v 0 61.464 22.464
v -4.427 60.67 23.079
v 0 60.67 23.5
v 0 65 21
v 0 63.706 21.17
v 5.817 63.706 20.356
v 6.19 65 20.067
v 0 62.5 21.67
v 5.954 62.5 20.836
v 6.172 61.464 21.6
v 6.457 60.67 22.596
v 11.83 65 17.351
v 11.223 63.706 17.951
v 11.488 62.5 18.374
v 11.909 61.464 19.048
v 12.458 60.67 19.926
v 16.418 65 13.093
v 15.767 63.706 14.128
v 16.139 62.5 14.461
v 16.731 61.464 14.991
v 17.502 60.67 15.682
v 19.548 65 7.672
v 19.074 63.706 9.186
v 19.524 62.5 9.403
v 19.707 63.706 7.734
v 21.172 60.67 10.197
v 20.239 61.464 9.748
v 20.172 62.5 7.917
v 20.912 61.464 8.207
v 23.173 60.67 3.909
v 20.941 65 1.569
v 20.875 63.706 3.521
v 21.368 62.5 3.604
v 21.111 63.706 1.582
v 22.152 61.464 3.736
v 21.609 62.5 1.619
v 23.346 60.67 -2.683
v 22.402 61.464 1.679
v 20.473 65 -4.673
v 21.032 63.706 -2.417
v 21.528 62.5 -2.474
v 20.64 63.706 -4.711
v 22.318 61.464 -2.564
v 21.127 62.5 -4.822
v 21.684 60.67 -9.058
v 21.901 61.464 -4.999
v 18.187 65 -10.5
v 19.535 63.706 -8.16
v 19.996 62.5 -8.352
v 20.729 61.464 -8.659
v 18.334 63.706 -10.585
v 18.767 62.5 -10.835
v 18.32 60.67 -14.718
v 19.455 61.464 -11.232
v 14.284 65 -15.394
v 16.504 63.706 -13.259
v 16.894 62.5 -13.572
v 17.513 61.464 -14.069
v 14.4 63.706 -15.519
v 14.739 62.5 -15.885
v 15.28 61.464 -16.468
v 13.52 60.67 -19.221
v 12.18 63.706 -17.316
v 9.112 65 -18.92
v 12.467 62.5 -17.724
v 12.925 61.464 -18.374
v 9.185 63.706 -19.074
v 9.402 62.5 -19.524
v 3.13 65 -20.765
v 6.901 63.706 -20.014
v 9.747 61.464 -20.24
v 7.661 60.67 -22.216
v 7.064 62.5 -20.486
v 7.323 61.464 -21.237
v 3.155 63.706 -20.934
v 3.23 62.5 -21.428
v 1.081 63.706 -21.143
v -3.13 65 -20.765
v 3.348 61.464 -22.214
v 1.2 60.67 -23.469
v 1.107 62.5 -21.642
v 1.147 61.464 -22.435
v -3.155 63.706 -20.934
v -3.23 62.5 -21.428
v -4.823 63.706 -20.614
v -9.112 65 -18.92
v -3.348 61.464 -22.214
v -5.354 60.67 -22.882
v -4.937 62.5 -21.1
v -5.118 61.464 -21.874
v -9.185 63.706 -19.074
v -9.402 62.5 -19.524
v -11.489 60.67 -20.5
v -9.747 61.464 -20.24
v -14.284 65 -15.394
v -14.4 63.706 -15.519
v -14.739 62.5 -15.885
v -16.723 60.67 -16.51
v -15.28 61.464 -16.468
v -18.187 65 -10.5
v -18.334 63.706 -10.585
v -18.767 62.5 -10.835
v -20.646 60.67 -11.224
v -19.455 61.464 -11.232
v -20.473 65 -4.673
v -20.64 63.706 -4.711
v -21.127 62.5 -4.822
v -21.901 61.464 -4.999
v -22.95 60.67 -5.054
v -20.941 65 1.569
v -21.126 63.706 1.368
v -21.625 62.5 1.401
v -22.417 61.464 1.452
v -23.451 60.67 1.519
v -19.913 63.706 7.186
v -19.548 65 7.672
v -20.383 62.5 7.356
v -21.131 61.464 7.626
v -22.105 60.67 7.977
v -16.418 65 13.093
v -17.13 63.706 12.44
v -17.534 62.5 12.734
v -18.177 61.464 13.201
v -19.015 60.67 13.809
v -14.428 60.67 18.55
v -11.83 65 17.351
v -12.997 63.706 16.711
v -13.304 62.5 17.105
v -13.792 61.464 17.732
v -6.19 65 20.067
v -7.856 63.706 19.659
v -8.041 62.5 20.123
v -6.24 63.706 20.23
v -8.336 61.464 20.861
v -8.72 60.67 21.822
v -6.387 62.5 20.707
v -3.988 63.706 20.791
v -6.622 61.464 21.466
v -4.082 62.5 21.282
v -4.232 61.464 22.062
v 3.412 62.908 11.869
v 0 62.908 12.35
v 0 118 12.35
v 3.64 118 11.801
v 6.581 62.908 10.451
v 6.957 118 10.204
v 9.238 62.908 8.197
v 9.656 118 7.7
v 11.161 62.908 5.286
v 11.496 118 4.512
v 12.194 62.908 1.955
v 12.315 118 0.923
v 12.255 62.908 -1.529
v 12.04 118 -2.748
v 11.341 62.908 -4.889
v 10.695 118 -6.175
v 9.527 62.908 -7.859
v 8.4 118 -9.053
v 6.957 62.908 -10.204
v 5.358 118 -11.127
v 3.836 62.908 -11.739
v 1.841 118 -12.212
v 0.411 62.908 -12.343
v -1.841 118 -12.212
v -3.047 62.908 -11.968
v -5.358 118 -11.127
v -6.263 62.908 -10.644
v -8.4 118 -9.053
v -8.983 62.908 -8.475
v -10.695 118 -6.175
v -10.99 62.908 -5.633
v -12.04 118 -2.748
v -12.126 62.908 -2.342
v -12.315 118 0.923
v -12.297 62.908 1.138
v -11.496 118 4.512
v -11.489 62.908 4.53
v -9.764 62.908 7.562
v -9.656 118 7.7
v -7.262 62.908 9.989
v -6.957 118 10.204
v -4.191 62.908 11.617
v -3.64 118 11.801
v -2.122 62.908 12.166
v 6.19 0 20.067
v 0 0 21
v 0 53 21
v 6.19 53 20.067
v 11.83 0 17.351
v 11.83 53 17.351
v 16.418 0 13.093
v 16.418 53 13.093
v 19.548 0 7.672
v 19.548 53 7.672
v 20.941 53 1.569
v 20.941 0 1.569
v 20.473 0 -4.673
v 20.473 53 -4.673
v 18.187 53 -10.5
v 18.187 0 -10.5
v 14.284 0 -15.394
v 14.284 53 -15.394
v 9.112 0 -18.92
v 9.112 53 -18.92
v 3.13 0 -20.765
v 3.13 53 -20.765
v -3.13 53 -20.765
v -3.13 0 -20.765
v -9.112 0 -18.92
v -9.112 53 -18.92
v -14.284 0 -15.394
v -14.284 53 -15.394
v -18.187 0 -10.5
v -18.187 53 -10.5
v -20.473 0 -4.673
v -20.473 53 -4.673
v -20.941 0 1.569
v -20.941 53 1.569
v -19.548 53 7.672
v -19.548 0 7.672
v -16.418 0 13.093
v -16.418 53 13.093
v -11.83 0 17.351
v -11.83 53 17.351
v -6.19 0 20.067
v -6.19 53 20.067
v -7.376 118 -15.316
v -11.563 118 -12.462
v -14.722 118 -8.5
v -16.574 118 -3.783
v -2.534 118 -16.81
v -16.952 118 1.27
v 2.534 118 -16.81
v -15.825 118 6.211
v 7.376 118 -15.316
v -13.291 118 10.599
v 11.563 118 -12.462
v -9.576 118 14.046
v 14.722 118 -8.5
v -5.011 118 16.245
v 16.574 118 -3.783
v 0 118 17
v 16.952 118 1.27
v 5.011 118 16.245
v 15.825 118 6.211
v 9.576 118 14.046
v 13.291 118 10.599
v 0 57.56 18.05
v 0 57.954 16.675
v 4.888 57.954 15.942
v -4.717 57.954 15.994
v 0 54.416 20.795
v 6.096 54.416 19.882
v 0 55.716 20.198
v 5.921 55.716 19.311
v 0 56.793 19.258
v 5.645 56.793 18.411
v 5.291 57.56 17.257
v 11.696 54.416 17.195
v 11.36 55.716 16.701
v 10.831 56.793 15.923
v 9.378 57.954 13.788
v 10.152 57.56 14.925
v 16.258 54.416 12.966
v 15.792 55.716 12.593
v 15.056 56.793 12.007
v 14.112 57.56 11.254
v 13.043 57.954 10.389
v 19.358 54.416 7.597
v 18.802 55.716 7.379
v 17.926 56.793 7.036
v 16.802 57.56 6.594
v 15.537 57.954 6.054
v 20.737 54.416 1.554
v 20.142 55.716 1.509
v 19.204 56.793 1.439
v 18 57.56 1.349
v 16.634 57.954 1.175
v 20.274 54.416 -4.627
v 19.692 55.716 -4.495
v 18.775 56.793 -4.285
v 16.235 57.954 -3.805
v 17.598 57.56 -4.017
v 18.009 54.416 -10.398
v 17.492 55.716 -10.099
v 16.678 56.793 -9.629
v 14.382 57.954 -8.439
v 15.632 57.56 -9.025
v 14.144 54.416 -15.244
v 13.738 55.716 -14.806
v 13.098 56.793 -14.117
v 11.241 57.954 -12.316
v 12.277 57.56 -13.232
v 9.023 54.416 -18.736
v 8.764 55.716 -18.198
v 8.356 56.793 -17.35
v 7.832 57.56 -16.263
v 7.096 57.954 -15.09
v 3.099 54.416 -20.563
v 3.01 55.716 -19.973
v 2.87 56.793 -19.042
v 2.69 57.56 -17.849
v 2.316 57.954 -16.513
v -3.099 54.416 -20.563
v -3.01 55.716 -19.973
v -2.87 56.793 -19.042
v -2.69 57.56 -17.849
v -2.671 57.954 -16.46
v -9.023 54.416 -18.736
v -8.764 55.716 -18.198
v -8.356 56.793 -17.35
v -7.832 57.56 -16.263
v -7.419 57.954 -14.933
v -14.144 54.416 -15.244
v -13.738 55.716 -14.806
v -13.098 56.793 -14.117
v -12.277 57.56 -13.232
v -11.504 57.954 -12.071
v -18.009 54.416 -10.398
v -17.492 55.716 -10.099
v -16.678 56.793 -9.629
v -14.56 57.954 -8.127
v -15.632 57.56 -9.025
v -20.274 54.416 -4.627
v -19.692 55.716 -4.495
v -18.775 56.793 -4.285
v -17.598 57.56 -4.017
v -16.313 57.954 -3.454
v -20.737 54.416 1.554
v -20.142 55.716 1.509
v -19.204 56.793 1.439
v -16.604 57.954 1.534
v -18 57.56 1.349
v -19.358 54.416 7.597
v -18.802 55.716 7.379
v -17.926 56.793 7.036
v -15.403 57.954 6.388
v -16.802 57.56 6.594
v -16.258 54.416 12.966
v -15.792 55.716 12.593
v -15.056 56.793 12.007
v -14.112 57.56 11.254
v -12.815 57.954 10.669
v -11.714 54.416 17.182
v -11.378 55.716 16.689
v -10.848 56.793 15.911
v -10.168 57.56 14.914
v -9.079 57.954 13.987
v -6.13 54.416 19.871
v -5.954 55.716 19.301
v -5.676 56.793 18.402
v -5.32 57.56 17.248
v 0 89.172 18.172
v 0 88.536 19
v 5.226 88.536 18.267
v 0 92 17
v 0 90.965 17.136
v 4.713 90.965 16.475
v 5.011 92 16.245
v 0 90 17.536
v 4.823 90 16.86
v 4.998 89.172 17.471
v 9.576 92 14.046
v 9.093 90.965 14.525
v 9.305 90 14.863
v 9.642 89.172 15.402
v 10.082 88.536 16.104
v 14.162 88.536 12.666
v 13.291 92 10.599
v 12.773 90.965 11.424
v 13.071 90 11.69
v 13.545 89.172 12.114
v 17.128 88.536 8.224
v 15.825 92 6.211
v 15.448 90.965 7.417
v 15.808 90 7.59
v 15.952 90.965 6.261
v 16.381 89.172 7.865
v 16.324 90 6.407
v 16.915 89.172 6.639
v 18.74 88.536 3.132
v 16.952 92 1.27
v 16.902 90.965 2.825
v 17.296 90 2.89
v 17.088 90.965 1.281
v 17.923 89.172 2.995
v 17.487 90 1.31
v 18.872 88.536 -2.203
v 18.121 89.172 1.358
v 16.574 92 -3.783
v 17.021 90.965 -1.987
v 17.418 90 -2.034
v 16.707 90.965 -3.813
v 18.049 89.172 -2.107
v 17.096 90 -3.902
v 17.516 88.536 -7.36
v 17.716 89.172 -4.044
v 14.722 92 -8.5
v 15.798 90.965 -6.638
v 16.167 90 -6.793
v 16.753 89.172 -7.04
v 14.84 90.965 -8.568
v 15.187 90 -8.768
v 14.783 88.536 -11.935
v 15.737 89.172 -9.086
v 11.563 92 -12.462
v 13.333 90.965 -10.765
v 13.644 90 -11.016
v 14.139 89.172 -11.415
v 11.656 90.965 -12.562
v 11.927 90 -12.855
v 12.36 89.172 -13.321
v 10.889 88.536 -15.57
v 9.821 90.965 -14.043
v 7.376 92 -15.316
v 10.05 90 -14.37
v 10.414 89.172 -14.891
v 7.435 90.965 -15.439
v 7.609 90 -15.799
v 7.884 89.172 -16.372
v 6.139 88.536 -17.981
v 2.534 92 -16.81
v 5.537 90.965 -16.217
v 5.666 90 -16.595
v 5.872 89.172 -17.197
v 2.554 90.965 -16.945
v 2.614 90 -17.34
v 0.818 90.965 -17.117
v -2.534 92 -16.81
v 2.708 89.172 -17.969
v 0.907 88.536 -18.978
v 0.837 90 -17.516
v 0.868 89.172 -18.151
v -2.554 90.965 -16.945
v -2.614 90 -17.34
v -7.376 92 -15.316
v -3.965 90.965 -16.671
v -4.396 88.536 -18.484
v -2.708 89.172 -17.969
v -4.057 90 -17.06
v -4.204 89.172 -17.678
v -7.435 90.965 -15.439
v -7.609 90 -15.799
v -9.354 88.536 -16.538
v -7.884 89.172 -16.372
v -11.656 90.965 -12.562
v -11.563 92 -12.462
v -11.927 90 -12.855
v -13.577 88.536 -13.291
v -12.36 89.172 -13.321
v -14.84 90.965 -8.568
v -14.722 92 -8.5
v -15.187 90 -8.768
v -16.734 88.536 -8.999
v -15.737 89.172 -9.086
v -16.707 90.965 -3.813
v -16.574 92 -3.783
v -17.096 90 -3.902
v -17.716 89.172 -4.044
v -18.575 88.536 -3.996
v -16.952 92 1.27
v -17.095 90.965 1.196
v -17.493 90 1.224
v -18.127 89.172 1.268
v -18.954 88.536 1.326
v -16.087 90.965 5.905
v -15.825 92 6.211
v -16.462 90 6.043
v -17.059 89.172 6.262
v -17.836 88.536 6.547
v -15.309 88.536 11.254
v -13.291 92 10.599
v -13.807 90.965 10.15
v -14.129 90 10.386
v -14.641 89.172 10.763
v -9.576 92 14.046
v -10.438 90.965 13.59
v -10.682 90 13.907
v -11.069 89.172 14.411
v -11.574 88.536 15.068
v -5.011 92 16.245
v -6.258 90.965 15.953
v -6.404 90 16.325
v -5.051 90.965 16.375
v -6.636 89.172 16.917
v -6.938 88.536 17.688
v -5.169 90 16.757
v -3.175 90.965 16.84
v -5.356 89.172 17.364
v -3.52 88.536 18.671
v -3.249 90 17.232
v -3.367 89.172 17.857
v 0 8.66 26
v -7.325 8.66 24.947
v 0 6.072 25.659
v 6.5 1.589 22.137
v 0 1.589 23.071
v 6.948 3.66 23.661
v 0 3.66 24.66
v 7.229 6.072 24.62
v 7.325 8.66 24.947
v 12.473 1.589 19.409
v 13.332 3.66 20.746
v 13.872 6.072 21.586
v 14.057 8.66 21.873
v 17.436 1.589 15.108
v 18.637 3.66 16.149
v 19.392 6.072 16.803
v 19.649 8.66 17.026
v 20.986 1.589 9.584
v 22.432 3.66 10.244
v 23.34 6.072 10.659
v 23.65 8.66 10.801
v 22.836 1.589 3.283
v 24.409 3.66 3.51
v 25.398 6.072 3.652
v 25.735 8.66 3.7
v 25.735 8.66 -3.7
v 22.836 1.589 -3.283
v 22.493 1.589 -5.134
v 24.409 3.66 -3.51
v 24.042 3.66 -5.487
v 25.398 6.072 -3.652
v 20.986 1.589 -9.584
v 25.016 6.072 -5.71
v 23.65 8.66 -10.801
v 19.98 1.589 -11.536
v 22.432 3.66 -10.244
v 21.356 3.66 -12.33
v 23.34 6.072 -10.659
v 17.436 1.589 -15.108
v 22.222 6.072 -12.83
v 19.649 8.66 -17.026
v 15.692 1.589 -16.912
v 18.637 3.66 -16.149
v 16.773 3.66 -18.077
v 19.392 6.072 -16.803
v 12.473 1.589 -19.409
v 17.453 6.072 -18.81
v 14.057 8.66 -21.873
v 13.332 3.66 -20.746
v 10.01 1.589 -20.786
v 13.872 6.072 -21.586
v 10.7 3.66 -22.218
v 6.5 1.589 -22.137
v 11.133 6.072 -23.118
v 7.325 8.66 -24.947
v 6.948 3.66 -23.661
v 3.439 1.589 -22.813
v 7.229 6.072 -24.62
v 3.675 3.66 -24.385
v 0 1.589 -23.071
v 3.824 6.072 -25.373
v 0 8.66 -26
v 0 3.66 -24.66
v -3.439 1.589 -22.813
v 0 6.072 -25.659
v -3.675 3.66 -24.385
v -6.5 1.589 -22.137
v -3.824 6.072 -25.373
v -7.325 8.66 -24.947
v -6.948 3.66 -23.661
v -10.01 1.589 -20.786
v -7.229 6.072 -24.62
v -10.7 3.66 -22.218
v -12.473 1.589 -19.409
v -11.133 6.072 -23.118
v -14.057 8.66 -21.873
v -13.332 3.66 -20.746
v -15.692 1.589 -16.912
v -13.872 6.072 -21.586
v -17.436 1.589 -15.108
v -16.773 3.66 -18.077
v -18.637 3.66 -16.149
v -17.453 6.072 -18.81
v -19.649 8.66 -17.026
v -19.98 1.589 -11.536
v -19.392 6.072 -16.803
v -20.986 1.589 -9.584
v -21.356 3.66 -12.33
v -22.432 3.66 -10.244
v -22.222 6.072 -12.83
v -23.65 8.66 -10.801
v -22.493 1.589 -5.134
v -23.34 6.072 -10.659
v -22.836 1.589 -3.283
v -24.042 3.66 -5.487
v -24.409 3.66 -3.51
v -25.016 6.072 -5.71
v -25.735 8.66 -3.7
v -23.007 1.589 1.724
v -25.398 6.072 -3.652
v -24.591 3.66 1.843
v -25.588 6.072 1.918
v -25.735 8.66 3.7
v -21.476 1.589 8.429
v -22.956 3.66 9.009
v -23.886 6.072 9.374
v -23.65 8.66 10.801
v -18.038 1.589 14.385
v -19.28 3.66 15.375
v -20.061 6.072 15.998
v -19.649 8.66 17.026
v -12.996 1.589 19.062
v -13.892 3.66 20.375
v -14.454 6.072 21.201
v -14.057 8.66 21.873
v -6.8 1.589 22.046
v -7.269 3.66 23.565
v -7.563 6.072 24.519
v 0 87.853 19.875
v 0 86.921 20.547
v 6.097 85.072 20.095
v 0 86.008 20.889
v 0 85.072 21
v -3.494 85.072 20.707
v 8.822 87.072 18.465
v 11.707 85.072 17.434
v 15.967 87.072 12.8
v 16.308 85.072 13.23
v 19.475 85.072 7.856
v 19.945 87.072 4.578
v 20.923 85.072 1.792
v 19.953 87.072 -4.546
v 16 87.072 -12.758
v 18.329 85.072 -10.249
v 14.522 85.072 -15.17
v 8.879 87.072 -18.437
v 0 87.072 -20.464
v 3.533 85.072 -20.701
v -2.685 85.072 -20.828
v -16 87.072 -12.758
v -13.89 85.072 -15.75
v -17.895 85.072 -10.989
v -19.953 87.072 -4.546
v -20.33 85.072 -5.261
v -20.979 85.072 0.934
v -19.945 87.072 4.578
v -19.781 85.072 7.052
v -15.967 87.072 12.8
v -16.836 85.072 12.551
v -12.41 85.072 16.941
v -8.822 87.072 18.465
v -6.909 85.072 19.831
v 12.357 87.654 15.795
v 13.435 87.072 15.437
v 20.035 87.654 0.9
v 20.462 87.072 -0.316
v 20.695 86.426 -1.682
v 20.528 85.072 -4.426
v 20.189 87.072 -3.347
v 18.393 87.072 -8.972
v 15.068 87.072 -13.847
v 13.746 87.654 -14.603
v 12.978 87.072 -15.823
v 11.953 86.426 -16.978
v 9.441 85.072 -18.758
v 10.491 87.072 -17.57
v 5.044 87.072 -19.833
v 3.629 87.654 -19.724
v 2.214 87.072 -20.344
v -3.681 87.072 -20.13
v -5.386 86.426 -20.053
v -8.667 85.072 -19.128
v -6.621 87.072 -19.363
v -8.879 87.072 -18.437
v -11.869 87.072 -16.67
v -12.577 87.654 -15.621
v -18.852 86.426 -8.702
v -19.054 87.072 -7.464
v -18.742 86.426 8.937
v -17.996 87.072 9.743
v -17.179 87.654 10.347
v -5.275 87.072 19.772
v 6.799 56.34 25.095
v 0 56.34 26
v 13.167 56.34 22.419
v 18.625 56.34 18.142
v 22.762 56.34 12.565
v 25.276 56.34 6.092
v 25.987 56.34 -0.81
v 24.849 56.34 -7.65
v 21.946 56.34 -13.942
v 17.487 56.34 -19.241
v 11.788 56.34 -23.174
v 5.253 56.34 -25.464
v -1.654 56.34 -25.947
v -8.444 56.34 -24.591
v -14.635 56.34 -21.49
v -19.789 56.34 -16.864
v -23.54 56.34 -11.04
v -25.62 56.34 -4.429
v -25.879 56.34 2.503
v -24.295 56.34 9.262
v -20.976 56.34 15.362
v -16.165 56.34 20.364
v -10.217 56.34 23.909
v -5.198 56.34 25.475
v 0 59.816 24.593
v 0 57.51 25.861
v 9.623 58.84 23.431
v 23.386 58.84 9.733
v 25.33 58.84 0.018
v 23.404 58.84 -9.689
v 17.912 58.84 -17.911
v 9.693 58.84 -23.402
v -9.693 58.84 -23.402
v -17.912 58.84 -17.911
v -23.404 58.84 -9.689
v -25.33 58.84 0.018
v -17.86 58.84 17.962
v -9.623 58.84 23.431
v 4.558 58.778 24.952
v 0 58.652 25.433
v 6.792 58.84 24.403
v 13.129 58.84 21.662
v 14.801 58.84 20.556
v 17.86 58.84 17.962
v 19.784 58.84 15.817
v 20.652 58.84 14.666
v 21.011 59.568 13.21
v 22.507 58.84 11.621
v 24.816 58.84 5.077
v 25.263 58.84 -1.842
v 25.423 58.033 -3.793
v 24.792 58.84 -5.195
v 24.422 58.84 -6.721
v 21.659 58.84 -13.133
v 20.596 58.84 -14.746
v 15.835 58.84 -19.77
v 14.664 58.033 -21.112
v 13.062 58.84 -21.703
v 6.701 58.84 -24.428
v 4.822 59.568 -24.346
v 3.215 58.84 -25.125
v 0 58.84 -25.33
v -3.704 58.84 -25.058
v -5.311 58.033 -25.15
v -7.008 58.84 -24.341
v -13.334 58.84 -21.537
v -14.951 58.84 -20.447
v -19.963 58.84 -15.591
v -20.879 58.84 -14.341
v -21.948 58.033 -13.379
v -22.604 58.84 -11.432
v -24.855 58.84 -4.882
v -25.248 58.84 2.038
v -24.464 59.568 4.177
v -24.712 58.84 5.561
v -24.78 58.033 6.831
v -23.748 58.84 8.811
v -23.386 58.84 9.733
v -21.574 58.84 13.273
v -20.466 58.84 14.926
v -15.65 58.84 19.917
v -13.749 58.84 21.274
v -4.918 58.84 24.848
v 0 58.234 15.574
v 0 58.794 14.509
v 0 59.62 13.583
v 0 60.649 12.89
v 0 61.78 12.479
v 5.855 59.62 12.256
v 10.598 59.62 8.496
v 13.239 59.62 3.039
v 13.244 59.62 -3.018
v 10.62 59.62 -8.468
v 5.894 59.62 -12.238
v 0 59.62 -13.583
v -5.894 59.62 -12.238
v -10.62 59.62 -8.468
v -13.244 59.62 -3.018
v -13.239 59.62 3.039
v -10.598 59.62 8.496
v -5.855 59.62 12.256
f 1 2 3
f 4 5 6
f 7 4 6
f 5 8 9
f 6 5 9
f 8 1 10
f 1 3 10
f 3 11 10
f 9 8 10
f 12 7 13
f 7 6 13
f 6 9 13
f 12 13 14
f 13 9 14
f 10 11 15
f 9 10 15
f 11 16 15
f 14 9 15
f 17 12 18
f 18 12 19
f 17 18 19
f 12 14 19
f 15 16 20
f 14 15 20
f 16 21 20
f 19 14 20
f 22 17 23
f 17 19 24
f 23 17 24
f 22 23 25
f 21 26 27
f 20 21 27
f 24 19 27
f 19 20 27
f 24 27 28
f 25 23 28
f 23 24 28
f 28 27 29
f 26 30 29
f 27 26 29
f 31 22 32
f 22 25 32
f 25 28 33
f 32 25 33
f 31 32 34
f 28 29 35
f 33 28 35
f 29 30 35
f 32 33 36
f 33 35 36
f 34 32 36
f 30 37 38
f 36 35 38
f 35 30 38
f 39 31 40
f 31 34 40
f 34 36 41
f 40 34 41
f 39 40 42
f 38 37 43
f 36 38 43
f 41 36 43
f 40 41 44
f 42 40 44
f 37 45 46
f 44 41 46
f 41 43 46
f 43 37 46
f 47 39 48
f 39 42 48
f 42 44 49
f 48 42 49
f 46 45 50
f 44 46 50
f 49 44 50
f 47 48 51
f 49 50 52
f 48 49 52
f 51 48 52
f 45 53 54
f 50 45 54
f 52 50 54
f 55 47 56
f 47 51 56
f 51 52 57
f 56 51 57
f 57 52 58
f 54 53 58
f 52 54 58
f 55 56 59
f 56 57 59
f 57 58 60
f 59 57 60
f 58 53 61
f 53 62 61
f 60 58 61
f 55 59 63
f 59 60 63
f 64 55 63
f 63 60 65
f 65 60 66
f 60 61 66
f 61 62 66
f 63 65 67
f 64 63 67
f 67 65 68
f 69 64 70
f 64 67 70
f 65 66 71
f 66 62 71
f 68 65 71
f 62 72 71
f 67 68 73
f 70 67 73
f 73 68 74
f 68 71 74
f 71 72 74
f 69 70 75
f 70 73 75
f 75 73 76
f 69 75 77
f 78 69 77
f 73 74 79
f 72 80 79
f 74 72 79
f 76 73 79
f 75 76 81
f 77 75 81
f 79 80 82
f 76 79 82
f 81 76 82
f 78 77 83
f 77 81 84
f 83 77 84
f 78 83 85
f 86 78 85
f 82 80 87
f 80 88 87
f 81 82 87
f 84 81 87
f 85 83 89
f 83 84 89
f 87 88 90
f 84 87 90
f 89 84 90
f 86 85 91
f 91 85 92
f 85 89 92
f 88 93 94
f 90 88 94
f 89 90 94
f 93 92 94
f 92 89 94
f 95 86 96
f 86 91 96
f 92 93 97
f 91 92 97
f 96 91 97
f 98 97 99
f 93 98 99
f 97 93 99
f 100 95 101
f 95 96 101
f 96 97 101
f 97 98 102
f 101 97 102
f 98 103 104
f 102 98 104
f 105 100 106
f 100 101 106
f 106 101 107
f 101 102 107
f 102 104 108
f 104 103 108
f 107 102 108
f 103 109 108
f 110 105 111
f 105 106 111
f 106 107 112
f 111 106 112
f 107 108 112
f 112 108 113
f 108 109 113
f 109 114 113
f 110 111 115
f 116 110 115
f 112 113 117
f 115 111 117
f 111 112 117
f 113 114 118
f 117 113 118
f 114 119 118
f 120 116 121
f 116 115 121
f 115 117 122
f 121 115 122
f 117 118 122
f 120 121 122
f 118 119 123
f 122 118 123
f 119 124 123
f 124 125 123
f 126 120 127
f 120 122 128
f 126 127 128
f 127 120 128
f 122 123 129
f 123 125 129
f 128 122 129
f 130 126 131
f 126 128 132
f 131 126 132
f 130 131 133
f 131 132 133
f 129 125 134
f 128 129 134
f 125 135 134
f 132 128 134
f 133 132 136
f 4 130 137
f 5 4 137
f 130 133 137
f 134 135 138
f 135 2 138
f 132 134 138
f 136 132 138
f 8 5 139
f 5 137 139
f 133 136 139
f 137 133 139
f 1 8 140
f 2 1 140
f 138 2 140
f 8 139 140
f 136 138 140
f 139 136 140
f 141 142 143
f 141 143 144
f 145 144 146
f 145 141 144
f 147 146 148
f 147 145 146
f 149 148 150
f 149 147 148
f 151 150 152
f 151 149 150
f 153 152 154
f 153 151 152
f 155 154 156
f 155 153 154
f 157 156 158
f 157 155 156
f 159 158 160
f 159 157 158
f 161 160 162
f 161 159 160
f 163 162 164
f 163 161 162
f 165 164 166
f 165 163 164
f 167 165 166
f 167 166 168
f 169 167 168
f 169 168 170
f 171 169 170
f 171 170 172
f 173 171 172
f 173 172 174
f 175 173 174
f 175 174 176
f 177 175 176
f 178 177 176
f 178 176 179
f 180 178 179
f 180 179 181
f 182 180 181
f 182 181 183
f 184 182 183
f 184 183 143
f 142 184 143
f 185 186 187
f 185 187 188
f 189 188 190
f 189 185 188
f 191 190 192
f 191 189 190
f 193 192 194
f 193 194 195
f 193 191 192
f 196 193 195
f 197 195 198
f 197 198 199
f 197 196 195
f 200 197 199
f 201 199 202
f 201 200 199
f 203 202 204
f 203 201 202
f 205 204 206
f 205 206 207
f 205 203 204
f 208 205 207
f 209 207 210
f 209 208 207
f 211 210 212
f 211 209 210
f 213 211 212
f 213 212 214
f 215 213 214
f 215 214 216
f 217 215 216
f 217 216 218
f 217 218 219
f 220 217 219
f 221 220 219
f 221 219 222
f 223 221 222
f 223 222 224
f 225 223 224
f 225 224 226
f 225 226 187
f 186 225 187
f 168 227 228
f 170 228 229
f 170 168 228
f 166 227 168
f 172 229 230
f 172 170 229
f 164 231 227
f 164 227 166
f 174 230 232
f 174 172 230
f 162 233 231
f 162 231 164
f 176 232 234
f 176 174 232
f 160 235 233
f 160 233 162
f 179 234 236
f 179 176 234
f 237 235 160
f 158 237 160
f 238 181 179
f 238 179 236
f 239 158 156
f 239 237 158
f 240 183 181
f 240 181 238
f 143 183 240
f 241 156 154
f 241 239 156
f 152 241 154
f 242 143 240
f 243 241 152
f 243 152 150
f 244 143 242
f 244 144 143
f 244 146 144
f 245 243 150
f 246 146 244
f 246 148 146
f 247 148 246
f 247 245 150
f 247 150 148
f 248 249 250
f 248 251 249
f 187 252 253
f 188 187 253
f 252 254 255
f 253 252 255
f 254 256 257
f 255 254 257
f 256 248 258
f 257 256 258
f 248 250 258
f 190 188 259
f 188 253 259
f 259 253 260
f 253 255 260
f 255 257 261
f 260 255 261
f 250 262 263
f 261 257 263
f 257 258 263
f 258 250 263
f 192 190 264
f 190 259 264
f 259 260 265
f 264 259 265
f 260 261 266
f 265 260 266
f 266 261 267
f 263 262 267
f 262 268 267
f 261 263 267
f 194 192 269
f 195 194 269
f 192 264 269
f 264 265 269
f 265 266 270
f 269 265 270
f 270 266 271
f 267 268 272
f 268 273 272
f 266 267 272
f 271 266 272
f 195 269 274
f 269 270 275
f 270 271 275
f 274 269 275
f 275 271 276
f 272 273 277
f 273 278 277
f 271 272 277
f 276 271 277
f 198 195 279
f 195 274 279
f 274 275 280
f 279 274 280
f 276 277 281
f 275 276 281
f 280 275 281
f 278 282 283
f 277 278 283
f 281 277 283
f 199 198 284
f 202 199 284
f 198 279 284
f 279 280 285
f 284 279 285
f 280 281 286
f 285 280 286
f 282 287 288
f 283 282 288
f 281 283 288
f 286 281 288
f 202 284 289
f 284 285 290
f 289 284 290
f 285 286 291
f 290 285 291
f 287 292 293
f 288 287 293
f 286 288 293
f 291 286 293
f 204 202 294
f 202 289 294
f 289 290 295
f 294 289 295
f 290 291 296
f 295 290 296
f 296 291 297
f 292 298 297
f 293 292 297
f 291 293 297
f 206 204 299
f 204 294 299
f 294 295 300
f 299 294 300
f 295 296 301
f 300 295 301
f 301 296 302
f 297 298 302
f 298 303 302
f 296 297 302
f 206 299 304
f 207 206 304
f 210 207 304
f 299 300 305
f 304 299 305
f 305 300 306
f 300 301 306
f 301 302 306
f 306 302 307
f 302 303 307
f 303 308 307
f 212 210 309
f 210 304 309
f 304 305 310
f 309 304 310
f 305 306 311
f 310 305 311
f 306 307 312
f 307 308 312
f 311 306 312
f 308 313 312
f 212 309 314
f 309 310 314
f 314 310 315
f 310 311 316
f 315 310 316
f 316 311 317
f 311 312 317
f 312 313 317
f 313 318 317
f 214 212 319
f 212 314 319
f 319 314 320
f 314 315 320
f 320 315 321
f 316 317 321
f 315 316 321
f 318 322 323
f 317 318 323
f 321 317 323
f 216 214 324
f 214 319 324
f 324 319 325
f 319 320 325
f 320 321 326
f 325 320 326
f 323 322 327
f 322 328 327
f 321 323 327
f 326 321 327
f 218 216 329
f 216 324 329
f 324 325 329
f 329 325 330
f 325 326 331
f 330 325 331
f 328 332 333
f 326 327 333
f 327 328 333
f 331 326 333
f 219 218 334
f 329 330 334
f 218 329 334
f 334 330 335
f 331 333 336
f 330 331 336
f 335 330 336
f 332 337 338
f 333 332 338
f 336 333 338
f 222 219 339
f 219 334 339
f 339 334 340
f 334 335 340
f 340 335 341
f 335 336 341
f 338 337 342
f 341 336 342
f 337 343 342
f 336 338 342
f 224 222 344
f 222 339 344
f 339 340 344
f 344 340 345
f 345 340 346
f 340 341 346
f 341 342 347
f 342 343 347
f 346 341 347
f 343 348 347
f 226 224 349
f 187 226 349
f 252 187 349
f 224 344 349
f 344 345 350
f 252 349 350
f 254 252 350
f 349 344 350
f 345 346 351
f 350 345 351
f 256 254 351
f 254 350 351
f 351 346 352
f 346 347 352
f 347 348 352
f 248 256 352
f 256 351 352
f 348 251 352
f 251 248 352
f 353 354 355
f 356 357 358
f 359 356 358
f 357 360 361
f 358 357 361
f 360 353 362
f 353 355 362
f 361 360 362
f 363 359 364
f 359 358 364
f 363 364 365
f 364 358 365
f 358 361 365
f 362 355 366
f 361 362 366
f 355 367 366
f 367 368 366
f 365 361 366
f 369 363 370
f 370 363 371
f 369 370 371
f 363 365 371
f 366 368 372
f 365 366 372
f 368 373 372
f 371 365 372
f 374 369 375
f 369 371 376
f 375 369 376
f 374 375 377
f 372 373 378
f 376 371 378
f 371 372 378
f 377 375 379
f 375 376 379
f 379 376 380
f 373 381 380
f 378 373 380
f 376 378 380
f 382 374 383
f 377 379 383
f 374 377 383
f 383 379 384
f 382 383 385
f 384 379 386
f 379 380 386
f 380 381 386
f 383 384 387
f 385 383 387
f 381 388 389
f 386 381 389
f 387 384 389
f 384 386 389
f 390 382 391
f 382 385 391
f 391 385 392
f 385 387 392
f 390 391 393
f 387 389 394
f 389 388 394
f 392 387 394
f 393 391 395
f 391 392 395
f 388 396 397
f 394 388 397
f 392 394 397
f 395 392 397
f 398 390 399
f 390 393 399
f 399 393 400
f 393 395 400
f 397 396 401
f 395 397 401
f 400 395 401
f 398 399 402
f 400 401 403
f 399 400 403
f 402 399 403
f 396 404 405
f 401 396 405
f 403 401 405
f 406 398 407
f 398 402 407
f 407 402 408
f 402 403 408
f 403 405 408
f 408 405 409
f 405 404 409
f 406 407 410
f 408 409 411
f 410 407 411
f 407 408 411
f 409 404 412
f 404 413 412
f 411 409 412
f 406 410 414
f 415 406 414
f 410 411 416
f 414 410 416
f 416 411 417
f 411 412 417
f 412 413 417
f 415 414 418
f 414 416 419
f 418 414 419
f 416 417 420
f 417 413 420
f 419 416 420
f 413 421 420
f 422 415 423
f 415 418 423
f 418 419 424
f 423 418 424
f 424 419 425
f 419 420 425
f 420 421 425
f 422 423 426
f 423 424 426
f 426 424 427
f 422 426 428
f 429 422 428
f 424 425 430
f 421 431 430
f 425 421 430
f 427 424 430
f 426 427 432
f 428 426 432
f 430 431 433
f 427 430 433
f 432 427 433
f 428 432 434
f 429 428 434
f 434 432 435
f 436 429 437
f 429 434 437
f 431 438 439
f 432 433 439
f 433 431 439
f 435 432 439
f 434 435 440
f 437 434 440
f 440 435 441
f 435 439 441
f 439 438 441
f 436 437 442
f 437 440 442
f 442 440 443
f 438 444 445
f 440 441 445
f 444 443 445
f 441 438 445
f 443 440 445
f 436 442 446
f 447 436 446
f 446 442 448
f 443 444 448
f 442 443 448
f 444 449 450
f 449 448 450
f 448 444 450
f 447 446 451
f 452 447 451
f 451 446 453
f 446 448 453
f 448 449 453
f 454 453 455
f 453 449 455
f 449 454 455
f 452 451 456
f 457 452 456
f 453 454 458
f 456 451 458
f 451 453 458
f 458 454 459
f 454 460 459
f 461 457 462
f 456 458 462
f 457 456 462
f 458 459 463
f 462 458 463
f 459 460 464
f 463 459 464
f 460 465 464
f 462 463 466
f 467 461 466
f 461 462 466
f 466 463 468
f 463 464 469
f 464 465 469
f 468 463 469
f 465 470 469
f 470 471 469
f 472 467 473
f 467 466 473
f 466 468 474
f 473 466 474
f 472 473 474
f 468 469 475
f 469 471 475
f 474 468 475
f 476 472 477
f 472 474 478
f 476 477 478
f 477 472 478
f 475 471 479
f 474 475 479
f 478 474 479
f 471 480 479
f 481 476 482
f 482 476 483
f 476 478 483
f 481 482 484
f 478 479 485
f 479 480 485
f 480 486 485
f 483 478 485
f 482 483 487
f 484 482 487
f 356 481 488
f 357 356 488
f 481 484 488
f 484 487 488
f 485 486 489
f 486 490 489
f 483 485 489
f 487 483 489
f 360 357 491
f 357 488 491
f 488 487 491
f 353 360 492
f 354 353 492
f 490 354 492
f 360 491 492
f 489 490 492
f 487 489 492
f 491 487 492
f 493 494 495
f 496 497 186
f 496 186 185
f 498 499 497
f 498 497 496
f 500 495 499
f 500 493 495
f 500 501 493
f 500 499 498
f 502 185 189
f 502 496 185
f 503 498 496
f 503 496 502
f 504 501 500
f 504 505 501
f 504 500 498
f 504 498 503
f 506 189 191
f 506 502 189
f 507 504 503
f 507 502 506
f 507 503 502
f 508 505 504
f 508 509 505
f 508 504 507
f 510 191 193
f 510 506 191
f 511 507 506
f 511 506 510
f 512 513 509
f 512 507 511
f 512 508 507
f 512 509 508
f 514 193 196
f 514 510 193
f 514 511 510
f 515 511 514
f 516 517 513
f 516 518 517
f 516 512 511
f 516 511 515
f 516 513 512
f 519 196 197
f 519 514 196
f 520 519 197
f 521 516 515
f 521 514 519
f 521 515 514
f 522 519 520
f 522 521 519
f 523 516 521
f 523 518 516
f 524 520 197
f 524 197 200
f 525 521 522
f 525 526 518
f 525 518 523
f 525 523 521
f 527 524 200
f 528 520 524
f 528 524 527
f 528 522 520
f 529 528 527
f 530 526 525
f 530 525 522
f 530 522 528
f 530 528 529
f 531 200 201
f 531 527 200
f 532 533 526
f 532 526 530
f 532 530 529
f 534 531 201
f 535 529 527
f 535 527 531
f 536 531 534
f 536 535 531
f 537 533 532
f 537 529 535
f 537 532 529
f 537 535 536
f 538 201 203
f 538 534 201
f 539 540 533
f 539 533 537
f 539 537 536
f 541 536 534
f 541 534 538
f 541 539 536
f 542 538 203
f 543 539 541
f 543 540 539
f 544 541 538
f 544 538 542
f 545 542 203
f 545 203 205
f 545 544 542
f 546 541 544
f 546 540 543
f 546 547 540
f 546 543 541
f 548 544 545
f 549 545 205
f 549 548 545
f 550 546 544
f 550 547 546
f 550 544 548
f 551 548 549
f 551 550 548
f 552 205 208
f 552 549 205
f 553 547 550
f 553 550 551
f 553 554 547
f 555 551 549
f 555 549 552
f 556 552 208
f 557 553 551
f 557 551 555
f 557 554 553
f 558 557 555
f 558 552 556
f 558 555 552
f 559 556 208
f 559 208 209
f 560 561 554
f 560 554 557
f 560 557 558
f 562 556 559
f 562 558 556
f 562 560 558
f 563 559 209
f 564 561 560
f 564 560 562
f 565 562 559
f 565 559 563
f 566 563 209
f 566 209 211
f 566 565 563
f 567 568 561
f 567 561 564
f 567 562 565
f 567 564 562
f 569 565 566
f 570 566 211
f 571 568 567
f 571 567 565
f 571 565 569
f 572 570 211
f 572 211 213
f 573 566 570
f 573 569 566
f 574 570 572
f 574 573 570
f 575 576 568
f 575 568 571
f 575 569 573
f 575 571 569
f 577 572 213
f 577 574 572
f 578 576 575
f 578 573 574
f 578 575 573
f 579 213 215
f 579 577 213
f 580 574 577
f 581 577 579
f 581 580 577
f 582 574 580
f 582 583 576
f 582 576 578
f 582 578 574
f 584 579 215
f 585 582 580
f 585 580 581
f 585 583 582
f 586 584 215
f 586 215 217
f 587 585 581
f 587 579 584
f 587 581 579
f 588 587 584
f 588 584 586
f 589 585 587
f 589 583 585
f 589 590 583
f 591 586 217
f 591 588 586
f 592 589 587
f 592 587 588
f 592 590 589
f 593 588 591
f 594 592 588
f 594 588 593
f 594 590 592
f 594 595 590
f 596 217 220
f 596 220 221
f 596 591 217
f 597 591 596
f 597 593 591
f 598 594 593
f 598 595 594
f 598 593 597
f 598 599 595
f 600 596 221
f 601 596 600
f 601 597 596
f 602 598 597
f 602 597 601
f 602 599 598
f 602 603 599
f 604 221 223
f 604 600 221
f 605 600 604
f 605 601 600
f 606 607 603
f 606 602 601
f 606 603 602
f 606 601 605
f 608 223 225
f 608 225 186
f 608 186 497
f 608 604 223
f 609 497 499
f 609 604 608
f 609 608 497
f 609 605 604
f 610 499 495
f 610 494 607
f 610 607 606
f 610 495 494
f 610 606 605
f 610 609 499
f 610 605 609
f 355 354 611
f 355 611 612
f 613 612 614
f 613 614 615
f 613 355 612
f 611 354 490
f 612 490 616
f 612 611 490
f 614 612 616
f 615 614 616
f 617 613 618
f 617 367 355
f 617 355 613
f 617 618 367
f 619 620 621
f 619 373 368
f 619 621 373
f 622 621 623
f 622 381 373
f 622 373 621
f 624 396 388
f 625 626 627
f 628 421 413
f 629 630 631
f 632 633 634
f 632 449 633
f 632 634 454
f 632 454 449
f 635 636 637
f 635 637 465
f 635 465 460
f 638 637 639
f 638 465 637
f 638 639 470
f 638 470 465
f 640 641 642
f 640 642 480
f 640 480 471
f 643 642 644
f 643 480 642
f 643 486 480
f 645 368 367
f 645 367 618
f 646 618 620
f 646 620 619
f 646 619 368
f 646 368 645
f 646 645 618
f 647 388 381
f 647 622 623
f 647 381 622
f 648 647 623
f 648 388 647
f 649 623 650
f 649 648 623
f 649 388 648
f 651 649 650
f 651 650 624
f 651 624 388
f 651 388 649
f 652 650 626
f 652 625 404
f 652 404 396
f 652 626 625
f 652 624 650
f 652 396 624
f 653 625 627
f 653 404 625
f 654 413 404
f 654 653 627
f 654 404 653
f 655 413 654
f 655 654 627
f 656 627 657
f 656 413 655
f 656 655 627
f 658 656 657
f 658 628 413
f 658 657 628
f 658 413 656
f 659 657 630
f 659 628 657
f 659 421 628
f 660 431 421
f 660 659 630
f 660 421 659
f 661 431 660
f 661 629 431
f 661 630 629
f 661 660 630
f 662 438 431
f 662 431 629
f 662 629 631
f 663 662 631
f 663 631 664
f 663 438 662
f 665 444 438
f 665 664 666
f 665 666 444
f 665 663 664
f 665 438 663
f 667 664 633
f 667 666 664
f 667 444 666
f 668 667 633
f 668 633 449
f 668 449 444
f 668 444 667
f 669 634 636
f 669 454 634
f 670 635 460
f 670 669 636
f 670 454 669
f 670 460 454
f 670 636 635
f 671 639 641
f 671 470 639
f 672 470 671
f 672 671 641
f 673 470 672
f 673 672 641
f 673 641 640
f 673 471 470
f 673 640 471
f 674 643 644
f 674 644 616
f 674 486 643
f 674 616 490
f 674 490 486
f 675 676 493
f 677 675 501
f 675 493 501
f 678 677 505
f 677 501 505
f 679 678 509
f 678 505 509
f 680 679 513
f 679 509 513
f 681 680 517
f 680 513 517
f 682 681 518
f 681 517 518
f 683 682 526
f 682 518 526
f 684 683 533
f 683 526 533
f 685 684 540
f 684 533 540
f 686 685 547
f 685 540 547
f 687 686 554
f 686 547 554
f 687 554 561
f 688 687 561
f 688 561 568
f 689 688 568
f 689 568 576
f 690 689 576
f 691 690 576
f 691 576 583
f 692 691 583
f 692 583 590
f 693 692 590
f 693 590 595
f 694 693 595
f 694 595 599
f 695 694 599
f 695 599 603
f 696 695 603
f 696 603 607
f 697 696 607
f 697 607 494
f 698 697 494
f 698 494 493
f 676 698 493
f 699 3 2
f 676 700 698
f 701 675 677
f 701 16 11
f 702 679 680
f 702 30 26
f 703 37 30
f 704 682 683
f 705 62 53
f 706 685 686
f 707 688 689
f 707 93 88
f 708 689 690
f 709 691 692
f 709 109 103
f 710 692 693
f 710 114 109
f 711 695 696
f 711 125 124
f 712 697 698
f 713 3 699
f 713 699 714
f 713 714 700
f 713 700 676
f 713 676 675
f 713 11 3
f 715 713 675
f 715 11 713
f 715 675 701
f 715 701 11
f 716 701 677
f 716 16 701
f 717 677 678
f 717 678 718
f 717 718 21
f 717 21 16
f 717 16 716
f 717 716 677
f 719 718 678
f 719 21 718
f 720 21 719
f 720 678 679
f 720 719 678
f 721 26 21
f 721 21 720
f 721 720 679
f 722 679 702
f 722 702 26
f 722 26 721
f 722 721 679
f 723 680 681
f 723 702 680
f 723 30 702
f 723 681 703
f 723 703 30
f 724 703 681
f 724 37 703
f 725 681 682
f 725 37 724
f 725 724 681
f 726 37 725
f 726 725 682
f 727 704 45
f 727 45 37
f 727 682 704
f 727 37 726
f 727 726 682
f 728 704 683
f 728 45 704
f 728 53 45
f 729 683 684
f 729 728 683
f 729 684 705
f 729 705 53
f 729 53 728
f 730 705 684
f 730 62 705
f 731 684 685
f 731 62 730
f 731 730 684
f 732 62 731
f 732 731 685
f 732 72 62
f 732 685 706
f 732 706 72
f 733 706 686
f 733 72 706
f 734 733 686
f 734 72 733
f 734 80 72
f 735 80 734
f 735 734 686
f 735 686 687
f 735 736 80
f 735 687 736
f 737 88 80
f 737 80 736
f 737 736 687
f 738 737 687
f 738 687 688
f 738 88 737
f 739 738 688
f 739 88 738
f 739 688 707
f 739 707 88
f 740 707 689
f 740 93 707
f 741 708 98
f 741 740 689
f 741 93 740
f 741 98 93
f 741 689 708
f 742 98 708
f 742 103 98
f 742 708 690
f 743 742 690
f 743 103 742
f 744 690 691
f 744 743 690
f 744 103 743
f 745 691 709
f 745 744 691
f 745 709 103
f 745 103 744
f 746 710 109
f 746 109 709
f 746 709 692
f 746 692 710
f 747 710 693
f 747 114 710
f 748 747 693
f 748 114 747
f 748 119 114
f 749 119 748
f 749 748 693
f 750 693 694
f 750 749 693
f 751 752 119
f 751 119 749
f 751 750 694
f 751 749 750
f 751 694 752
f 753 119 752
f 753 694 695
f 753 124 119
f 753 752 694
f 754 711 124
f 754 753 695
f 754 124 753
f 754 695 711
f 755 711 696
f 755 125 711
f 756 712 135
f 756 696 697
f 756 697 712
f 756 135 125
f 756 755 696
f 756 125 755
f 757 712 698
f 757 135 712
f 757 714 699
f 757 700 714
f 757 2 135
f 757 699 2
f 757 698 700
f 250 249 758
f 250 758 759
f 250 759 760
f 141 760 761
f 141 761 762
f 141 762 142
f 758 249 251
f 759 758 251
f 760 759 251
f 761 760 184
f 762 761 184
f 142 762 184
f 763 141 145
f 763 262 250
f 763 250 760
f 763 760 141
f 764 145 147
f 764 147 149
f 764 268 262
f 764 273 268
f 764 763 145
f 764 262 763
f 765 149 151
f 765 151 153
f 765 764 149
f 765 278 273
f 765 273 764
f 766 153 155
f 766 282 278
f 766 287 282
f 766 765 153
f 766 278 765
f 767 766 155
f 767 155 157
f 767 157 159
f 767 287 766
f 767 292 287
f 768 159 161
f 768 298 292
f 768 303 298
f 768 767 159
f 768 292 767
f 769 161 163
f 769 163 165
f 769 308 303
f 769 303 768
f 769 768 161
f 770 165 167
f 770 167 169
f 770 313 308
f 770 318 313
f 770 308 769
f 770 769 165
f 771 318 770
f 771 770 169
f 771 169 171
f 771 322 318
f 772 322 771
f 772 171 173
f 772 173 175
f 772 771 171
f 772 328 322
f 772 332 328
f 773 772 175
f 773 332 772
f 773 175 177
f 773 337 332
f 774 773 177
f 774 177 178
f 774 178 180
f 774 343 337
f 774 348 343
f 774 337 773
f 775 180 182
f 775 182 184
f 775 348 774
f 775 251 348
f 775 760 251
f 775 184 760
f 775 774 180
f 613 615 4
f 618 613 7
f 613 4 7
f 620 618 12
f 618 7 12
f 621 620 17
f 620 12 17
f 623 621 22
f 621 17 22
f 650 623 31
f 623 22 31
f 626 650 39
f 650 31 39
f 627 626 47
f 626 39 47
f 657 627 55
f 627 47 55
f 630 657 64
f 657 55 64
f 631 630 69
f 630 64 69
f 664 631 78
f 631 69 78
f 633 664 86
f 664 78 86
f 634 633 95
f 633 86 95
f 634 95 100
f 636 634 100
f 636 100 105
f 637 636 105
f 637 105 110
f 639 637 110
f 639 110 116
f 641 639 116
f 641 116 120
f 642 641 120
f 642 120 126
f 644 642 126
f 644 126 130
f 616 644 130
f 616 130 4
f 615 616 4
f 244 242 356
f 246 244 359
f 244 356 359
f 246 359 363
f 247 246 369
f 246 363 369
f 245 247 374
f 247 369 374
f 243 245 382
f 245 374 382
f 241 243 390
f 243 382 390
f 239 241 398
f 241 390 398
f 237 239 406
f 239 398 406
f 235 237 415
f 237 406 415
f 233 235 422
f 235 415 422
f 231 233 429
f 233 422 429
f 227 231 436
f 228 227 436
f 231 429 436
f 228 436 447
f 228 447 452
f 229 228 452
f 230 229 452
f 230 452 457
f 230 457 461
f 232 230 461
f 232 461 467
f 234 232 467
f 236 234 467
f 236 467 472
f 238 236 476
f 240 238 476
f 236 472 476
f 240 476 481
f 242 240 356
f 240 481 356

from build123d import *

# Parameters (mm, degrees)
SKETCH_1_R      = 26
SKETCH_1_R_2    = 21
EXTRUDE_1_DEPTH = 60
FILLET_1_R      = 10
EXTRUDE_START   = -2
SKETCH_2_R      = 21
SKETCH_2_R_2    = 12.35
EXTRUDE_2_DEPTH = 30
SKETCH_3_R      = 17
SKETCH_3_R_2    = 12.35
EXTRUDE_3_DEPTH = 30
FILLET_3_R      = 4
FILLET_4_R      = 4
FILLET_6_R      = 5
FILLET_7_R      = 5
FILLET_8_R      = 5
FILLET_9_R      = 5


# Some blends are built 0.0001 mm under size
with BuildPart() as part:
    # Эскиз1 → Вытянуть1 (new body)
    with BuildSketch(Plane(origin=(0, 0, 0), x_dir=(1, 0, 0), z_dir=(0, 1, 0))):
        with Locations(Location((0, 0, 0), (0, 0, 270))):
            Circle(SKETCH_1_R)
        with Locations(Location((0, 0, 0), (0, 0, 270))):
            Circle(SKETCH_1_R_2, mode=Mode.SUBTRACT)
    extrude(amount=EXTRUDE_1_DEPTH)

    # Скругление1
    # the kernel refuses this fillet: 10 mm, written as the material it takes off along each edge
    with BuildSketch(Plane(origin=(0, 0, 0), x_dir=(0, 0, 1), z_dir=(-1, 0, 0))) as fillet_1_piece_1:
        with BuildLine():
            CenterArc((16, 8.660254038), FILLET_1_R, 300, 60)
            Line((21, 0), (21.1, -0.173205081))
            ThreePointArc((21.1, -0.173205081), (23.5, -0.2), (26, -0.2))
            Line((26, -0.2), (26.2, 0))
            Line((26.2, 0), (26.2, 8.660254038))
            Line((26.2, 8.660254038), (26, 8.660254038))
        make_face()
    revolve(axis=Axis((0, 0, 0), (0, 1, 0)), mode=Mode.SUBTRACT)

    # Эскиз2 → Вытянуть2 (add)
    with BuildSketch(Plane(origin=(0, 60, 0), x_dir=(1, 0, 0), z_dir=(0, 1, 0)).offset(EXTRUDE_START)):
        with Locations(Location((0, 0, 0), (0, 0, 270))):
            Circle(SKETCH_2_R)
        with Locations(Location((0, 0, 0), (0, 0, 270))):
            Circle(SKETCH_2_R_2, mode=Mode.SUBTRACT)
    extrude(amount=EXTRUDE_2_DEPTH)

    # Эскиз3 → Вытянуть3 (add)
    with BuildSketch(Plane(origin=(0, 88, 0), x_dir=(1, 0, 0), z_dir=(0, 1, 0))):
        with Locations(Location((0, 0, 0), (0, 0, 270))):
            Circle(SKETCH_3_R)
        with Locations(Location((0, 0, 0), (0, 0, 270))):
            Circle(SKETCH_3_R_2, mode=Mode.SUBTRACT)
    extrude(amount=EXTRUDE_3_DEPTH)

    # Скругление3
    fillet_3_edges = [part.edges().sort_by_distance(p)[0] for p in [
        (0, 88, -17),
    ]]
    fillet(fillet_3_edges, radius=FILLET_3_R - 0.0001)  # a hair under: the kernel refuses the full size

    # Скругление4
    fillet_4_edges = [part.edges().sort_by_distance(p)[0] for p in [
        (0, 88, -21),
    ]]
    fillet(fillet_4_edges, radius=FILLET_4_R)

    # Скругление6
    fillet_6_edges = [part.edges().sort_by_distance(p)[0] for p in [
        (0, 60, -21),
    ]]
    fillet(fillet_6_edges, radius=FILLET_6_R - 0.0001)  # a hair under: the kernel refuses the full size

    # Скругление7
    fillet_7_edges = [part.edges().sort_by_distance(p)[0] for p in [
        (0, 60, -26),
    ]]
    fillet(fillet_7_edges, radius=FILLET_7_R)

    # Скругление8
    fillet_8_edges = [part.edges().sort_by_distance(p)[0] for p in [
        (0, 58, -21),
    ]]
    fillet(fillet_8_edges, radius=FILLET_8_R)

    # Скругление9
    fillet_9_edges = [part.edges().sort_by_distance(p)[0] for p in [
        (0, 58, -12.35),
    ]]
    fillet(fillet_9_edges, radius=FILLET_9_R)


solid = part.part
